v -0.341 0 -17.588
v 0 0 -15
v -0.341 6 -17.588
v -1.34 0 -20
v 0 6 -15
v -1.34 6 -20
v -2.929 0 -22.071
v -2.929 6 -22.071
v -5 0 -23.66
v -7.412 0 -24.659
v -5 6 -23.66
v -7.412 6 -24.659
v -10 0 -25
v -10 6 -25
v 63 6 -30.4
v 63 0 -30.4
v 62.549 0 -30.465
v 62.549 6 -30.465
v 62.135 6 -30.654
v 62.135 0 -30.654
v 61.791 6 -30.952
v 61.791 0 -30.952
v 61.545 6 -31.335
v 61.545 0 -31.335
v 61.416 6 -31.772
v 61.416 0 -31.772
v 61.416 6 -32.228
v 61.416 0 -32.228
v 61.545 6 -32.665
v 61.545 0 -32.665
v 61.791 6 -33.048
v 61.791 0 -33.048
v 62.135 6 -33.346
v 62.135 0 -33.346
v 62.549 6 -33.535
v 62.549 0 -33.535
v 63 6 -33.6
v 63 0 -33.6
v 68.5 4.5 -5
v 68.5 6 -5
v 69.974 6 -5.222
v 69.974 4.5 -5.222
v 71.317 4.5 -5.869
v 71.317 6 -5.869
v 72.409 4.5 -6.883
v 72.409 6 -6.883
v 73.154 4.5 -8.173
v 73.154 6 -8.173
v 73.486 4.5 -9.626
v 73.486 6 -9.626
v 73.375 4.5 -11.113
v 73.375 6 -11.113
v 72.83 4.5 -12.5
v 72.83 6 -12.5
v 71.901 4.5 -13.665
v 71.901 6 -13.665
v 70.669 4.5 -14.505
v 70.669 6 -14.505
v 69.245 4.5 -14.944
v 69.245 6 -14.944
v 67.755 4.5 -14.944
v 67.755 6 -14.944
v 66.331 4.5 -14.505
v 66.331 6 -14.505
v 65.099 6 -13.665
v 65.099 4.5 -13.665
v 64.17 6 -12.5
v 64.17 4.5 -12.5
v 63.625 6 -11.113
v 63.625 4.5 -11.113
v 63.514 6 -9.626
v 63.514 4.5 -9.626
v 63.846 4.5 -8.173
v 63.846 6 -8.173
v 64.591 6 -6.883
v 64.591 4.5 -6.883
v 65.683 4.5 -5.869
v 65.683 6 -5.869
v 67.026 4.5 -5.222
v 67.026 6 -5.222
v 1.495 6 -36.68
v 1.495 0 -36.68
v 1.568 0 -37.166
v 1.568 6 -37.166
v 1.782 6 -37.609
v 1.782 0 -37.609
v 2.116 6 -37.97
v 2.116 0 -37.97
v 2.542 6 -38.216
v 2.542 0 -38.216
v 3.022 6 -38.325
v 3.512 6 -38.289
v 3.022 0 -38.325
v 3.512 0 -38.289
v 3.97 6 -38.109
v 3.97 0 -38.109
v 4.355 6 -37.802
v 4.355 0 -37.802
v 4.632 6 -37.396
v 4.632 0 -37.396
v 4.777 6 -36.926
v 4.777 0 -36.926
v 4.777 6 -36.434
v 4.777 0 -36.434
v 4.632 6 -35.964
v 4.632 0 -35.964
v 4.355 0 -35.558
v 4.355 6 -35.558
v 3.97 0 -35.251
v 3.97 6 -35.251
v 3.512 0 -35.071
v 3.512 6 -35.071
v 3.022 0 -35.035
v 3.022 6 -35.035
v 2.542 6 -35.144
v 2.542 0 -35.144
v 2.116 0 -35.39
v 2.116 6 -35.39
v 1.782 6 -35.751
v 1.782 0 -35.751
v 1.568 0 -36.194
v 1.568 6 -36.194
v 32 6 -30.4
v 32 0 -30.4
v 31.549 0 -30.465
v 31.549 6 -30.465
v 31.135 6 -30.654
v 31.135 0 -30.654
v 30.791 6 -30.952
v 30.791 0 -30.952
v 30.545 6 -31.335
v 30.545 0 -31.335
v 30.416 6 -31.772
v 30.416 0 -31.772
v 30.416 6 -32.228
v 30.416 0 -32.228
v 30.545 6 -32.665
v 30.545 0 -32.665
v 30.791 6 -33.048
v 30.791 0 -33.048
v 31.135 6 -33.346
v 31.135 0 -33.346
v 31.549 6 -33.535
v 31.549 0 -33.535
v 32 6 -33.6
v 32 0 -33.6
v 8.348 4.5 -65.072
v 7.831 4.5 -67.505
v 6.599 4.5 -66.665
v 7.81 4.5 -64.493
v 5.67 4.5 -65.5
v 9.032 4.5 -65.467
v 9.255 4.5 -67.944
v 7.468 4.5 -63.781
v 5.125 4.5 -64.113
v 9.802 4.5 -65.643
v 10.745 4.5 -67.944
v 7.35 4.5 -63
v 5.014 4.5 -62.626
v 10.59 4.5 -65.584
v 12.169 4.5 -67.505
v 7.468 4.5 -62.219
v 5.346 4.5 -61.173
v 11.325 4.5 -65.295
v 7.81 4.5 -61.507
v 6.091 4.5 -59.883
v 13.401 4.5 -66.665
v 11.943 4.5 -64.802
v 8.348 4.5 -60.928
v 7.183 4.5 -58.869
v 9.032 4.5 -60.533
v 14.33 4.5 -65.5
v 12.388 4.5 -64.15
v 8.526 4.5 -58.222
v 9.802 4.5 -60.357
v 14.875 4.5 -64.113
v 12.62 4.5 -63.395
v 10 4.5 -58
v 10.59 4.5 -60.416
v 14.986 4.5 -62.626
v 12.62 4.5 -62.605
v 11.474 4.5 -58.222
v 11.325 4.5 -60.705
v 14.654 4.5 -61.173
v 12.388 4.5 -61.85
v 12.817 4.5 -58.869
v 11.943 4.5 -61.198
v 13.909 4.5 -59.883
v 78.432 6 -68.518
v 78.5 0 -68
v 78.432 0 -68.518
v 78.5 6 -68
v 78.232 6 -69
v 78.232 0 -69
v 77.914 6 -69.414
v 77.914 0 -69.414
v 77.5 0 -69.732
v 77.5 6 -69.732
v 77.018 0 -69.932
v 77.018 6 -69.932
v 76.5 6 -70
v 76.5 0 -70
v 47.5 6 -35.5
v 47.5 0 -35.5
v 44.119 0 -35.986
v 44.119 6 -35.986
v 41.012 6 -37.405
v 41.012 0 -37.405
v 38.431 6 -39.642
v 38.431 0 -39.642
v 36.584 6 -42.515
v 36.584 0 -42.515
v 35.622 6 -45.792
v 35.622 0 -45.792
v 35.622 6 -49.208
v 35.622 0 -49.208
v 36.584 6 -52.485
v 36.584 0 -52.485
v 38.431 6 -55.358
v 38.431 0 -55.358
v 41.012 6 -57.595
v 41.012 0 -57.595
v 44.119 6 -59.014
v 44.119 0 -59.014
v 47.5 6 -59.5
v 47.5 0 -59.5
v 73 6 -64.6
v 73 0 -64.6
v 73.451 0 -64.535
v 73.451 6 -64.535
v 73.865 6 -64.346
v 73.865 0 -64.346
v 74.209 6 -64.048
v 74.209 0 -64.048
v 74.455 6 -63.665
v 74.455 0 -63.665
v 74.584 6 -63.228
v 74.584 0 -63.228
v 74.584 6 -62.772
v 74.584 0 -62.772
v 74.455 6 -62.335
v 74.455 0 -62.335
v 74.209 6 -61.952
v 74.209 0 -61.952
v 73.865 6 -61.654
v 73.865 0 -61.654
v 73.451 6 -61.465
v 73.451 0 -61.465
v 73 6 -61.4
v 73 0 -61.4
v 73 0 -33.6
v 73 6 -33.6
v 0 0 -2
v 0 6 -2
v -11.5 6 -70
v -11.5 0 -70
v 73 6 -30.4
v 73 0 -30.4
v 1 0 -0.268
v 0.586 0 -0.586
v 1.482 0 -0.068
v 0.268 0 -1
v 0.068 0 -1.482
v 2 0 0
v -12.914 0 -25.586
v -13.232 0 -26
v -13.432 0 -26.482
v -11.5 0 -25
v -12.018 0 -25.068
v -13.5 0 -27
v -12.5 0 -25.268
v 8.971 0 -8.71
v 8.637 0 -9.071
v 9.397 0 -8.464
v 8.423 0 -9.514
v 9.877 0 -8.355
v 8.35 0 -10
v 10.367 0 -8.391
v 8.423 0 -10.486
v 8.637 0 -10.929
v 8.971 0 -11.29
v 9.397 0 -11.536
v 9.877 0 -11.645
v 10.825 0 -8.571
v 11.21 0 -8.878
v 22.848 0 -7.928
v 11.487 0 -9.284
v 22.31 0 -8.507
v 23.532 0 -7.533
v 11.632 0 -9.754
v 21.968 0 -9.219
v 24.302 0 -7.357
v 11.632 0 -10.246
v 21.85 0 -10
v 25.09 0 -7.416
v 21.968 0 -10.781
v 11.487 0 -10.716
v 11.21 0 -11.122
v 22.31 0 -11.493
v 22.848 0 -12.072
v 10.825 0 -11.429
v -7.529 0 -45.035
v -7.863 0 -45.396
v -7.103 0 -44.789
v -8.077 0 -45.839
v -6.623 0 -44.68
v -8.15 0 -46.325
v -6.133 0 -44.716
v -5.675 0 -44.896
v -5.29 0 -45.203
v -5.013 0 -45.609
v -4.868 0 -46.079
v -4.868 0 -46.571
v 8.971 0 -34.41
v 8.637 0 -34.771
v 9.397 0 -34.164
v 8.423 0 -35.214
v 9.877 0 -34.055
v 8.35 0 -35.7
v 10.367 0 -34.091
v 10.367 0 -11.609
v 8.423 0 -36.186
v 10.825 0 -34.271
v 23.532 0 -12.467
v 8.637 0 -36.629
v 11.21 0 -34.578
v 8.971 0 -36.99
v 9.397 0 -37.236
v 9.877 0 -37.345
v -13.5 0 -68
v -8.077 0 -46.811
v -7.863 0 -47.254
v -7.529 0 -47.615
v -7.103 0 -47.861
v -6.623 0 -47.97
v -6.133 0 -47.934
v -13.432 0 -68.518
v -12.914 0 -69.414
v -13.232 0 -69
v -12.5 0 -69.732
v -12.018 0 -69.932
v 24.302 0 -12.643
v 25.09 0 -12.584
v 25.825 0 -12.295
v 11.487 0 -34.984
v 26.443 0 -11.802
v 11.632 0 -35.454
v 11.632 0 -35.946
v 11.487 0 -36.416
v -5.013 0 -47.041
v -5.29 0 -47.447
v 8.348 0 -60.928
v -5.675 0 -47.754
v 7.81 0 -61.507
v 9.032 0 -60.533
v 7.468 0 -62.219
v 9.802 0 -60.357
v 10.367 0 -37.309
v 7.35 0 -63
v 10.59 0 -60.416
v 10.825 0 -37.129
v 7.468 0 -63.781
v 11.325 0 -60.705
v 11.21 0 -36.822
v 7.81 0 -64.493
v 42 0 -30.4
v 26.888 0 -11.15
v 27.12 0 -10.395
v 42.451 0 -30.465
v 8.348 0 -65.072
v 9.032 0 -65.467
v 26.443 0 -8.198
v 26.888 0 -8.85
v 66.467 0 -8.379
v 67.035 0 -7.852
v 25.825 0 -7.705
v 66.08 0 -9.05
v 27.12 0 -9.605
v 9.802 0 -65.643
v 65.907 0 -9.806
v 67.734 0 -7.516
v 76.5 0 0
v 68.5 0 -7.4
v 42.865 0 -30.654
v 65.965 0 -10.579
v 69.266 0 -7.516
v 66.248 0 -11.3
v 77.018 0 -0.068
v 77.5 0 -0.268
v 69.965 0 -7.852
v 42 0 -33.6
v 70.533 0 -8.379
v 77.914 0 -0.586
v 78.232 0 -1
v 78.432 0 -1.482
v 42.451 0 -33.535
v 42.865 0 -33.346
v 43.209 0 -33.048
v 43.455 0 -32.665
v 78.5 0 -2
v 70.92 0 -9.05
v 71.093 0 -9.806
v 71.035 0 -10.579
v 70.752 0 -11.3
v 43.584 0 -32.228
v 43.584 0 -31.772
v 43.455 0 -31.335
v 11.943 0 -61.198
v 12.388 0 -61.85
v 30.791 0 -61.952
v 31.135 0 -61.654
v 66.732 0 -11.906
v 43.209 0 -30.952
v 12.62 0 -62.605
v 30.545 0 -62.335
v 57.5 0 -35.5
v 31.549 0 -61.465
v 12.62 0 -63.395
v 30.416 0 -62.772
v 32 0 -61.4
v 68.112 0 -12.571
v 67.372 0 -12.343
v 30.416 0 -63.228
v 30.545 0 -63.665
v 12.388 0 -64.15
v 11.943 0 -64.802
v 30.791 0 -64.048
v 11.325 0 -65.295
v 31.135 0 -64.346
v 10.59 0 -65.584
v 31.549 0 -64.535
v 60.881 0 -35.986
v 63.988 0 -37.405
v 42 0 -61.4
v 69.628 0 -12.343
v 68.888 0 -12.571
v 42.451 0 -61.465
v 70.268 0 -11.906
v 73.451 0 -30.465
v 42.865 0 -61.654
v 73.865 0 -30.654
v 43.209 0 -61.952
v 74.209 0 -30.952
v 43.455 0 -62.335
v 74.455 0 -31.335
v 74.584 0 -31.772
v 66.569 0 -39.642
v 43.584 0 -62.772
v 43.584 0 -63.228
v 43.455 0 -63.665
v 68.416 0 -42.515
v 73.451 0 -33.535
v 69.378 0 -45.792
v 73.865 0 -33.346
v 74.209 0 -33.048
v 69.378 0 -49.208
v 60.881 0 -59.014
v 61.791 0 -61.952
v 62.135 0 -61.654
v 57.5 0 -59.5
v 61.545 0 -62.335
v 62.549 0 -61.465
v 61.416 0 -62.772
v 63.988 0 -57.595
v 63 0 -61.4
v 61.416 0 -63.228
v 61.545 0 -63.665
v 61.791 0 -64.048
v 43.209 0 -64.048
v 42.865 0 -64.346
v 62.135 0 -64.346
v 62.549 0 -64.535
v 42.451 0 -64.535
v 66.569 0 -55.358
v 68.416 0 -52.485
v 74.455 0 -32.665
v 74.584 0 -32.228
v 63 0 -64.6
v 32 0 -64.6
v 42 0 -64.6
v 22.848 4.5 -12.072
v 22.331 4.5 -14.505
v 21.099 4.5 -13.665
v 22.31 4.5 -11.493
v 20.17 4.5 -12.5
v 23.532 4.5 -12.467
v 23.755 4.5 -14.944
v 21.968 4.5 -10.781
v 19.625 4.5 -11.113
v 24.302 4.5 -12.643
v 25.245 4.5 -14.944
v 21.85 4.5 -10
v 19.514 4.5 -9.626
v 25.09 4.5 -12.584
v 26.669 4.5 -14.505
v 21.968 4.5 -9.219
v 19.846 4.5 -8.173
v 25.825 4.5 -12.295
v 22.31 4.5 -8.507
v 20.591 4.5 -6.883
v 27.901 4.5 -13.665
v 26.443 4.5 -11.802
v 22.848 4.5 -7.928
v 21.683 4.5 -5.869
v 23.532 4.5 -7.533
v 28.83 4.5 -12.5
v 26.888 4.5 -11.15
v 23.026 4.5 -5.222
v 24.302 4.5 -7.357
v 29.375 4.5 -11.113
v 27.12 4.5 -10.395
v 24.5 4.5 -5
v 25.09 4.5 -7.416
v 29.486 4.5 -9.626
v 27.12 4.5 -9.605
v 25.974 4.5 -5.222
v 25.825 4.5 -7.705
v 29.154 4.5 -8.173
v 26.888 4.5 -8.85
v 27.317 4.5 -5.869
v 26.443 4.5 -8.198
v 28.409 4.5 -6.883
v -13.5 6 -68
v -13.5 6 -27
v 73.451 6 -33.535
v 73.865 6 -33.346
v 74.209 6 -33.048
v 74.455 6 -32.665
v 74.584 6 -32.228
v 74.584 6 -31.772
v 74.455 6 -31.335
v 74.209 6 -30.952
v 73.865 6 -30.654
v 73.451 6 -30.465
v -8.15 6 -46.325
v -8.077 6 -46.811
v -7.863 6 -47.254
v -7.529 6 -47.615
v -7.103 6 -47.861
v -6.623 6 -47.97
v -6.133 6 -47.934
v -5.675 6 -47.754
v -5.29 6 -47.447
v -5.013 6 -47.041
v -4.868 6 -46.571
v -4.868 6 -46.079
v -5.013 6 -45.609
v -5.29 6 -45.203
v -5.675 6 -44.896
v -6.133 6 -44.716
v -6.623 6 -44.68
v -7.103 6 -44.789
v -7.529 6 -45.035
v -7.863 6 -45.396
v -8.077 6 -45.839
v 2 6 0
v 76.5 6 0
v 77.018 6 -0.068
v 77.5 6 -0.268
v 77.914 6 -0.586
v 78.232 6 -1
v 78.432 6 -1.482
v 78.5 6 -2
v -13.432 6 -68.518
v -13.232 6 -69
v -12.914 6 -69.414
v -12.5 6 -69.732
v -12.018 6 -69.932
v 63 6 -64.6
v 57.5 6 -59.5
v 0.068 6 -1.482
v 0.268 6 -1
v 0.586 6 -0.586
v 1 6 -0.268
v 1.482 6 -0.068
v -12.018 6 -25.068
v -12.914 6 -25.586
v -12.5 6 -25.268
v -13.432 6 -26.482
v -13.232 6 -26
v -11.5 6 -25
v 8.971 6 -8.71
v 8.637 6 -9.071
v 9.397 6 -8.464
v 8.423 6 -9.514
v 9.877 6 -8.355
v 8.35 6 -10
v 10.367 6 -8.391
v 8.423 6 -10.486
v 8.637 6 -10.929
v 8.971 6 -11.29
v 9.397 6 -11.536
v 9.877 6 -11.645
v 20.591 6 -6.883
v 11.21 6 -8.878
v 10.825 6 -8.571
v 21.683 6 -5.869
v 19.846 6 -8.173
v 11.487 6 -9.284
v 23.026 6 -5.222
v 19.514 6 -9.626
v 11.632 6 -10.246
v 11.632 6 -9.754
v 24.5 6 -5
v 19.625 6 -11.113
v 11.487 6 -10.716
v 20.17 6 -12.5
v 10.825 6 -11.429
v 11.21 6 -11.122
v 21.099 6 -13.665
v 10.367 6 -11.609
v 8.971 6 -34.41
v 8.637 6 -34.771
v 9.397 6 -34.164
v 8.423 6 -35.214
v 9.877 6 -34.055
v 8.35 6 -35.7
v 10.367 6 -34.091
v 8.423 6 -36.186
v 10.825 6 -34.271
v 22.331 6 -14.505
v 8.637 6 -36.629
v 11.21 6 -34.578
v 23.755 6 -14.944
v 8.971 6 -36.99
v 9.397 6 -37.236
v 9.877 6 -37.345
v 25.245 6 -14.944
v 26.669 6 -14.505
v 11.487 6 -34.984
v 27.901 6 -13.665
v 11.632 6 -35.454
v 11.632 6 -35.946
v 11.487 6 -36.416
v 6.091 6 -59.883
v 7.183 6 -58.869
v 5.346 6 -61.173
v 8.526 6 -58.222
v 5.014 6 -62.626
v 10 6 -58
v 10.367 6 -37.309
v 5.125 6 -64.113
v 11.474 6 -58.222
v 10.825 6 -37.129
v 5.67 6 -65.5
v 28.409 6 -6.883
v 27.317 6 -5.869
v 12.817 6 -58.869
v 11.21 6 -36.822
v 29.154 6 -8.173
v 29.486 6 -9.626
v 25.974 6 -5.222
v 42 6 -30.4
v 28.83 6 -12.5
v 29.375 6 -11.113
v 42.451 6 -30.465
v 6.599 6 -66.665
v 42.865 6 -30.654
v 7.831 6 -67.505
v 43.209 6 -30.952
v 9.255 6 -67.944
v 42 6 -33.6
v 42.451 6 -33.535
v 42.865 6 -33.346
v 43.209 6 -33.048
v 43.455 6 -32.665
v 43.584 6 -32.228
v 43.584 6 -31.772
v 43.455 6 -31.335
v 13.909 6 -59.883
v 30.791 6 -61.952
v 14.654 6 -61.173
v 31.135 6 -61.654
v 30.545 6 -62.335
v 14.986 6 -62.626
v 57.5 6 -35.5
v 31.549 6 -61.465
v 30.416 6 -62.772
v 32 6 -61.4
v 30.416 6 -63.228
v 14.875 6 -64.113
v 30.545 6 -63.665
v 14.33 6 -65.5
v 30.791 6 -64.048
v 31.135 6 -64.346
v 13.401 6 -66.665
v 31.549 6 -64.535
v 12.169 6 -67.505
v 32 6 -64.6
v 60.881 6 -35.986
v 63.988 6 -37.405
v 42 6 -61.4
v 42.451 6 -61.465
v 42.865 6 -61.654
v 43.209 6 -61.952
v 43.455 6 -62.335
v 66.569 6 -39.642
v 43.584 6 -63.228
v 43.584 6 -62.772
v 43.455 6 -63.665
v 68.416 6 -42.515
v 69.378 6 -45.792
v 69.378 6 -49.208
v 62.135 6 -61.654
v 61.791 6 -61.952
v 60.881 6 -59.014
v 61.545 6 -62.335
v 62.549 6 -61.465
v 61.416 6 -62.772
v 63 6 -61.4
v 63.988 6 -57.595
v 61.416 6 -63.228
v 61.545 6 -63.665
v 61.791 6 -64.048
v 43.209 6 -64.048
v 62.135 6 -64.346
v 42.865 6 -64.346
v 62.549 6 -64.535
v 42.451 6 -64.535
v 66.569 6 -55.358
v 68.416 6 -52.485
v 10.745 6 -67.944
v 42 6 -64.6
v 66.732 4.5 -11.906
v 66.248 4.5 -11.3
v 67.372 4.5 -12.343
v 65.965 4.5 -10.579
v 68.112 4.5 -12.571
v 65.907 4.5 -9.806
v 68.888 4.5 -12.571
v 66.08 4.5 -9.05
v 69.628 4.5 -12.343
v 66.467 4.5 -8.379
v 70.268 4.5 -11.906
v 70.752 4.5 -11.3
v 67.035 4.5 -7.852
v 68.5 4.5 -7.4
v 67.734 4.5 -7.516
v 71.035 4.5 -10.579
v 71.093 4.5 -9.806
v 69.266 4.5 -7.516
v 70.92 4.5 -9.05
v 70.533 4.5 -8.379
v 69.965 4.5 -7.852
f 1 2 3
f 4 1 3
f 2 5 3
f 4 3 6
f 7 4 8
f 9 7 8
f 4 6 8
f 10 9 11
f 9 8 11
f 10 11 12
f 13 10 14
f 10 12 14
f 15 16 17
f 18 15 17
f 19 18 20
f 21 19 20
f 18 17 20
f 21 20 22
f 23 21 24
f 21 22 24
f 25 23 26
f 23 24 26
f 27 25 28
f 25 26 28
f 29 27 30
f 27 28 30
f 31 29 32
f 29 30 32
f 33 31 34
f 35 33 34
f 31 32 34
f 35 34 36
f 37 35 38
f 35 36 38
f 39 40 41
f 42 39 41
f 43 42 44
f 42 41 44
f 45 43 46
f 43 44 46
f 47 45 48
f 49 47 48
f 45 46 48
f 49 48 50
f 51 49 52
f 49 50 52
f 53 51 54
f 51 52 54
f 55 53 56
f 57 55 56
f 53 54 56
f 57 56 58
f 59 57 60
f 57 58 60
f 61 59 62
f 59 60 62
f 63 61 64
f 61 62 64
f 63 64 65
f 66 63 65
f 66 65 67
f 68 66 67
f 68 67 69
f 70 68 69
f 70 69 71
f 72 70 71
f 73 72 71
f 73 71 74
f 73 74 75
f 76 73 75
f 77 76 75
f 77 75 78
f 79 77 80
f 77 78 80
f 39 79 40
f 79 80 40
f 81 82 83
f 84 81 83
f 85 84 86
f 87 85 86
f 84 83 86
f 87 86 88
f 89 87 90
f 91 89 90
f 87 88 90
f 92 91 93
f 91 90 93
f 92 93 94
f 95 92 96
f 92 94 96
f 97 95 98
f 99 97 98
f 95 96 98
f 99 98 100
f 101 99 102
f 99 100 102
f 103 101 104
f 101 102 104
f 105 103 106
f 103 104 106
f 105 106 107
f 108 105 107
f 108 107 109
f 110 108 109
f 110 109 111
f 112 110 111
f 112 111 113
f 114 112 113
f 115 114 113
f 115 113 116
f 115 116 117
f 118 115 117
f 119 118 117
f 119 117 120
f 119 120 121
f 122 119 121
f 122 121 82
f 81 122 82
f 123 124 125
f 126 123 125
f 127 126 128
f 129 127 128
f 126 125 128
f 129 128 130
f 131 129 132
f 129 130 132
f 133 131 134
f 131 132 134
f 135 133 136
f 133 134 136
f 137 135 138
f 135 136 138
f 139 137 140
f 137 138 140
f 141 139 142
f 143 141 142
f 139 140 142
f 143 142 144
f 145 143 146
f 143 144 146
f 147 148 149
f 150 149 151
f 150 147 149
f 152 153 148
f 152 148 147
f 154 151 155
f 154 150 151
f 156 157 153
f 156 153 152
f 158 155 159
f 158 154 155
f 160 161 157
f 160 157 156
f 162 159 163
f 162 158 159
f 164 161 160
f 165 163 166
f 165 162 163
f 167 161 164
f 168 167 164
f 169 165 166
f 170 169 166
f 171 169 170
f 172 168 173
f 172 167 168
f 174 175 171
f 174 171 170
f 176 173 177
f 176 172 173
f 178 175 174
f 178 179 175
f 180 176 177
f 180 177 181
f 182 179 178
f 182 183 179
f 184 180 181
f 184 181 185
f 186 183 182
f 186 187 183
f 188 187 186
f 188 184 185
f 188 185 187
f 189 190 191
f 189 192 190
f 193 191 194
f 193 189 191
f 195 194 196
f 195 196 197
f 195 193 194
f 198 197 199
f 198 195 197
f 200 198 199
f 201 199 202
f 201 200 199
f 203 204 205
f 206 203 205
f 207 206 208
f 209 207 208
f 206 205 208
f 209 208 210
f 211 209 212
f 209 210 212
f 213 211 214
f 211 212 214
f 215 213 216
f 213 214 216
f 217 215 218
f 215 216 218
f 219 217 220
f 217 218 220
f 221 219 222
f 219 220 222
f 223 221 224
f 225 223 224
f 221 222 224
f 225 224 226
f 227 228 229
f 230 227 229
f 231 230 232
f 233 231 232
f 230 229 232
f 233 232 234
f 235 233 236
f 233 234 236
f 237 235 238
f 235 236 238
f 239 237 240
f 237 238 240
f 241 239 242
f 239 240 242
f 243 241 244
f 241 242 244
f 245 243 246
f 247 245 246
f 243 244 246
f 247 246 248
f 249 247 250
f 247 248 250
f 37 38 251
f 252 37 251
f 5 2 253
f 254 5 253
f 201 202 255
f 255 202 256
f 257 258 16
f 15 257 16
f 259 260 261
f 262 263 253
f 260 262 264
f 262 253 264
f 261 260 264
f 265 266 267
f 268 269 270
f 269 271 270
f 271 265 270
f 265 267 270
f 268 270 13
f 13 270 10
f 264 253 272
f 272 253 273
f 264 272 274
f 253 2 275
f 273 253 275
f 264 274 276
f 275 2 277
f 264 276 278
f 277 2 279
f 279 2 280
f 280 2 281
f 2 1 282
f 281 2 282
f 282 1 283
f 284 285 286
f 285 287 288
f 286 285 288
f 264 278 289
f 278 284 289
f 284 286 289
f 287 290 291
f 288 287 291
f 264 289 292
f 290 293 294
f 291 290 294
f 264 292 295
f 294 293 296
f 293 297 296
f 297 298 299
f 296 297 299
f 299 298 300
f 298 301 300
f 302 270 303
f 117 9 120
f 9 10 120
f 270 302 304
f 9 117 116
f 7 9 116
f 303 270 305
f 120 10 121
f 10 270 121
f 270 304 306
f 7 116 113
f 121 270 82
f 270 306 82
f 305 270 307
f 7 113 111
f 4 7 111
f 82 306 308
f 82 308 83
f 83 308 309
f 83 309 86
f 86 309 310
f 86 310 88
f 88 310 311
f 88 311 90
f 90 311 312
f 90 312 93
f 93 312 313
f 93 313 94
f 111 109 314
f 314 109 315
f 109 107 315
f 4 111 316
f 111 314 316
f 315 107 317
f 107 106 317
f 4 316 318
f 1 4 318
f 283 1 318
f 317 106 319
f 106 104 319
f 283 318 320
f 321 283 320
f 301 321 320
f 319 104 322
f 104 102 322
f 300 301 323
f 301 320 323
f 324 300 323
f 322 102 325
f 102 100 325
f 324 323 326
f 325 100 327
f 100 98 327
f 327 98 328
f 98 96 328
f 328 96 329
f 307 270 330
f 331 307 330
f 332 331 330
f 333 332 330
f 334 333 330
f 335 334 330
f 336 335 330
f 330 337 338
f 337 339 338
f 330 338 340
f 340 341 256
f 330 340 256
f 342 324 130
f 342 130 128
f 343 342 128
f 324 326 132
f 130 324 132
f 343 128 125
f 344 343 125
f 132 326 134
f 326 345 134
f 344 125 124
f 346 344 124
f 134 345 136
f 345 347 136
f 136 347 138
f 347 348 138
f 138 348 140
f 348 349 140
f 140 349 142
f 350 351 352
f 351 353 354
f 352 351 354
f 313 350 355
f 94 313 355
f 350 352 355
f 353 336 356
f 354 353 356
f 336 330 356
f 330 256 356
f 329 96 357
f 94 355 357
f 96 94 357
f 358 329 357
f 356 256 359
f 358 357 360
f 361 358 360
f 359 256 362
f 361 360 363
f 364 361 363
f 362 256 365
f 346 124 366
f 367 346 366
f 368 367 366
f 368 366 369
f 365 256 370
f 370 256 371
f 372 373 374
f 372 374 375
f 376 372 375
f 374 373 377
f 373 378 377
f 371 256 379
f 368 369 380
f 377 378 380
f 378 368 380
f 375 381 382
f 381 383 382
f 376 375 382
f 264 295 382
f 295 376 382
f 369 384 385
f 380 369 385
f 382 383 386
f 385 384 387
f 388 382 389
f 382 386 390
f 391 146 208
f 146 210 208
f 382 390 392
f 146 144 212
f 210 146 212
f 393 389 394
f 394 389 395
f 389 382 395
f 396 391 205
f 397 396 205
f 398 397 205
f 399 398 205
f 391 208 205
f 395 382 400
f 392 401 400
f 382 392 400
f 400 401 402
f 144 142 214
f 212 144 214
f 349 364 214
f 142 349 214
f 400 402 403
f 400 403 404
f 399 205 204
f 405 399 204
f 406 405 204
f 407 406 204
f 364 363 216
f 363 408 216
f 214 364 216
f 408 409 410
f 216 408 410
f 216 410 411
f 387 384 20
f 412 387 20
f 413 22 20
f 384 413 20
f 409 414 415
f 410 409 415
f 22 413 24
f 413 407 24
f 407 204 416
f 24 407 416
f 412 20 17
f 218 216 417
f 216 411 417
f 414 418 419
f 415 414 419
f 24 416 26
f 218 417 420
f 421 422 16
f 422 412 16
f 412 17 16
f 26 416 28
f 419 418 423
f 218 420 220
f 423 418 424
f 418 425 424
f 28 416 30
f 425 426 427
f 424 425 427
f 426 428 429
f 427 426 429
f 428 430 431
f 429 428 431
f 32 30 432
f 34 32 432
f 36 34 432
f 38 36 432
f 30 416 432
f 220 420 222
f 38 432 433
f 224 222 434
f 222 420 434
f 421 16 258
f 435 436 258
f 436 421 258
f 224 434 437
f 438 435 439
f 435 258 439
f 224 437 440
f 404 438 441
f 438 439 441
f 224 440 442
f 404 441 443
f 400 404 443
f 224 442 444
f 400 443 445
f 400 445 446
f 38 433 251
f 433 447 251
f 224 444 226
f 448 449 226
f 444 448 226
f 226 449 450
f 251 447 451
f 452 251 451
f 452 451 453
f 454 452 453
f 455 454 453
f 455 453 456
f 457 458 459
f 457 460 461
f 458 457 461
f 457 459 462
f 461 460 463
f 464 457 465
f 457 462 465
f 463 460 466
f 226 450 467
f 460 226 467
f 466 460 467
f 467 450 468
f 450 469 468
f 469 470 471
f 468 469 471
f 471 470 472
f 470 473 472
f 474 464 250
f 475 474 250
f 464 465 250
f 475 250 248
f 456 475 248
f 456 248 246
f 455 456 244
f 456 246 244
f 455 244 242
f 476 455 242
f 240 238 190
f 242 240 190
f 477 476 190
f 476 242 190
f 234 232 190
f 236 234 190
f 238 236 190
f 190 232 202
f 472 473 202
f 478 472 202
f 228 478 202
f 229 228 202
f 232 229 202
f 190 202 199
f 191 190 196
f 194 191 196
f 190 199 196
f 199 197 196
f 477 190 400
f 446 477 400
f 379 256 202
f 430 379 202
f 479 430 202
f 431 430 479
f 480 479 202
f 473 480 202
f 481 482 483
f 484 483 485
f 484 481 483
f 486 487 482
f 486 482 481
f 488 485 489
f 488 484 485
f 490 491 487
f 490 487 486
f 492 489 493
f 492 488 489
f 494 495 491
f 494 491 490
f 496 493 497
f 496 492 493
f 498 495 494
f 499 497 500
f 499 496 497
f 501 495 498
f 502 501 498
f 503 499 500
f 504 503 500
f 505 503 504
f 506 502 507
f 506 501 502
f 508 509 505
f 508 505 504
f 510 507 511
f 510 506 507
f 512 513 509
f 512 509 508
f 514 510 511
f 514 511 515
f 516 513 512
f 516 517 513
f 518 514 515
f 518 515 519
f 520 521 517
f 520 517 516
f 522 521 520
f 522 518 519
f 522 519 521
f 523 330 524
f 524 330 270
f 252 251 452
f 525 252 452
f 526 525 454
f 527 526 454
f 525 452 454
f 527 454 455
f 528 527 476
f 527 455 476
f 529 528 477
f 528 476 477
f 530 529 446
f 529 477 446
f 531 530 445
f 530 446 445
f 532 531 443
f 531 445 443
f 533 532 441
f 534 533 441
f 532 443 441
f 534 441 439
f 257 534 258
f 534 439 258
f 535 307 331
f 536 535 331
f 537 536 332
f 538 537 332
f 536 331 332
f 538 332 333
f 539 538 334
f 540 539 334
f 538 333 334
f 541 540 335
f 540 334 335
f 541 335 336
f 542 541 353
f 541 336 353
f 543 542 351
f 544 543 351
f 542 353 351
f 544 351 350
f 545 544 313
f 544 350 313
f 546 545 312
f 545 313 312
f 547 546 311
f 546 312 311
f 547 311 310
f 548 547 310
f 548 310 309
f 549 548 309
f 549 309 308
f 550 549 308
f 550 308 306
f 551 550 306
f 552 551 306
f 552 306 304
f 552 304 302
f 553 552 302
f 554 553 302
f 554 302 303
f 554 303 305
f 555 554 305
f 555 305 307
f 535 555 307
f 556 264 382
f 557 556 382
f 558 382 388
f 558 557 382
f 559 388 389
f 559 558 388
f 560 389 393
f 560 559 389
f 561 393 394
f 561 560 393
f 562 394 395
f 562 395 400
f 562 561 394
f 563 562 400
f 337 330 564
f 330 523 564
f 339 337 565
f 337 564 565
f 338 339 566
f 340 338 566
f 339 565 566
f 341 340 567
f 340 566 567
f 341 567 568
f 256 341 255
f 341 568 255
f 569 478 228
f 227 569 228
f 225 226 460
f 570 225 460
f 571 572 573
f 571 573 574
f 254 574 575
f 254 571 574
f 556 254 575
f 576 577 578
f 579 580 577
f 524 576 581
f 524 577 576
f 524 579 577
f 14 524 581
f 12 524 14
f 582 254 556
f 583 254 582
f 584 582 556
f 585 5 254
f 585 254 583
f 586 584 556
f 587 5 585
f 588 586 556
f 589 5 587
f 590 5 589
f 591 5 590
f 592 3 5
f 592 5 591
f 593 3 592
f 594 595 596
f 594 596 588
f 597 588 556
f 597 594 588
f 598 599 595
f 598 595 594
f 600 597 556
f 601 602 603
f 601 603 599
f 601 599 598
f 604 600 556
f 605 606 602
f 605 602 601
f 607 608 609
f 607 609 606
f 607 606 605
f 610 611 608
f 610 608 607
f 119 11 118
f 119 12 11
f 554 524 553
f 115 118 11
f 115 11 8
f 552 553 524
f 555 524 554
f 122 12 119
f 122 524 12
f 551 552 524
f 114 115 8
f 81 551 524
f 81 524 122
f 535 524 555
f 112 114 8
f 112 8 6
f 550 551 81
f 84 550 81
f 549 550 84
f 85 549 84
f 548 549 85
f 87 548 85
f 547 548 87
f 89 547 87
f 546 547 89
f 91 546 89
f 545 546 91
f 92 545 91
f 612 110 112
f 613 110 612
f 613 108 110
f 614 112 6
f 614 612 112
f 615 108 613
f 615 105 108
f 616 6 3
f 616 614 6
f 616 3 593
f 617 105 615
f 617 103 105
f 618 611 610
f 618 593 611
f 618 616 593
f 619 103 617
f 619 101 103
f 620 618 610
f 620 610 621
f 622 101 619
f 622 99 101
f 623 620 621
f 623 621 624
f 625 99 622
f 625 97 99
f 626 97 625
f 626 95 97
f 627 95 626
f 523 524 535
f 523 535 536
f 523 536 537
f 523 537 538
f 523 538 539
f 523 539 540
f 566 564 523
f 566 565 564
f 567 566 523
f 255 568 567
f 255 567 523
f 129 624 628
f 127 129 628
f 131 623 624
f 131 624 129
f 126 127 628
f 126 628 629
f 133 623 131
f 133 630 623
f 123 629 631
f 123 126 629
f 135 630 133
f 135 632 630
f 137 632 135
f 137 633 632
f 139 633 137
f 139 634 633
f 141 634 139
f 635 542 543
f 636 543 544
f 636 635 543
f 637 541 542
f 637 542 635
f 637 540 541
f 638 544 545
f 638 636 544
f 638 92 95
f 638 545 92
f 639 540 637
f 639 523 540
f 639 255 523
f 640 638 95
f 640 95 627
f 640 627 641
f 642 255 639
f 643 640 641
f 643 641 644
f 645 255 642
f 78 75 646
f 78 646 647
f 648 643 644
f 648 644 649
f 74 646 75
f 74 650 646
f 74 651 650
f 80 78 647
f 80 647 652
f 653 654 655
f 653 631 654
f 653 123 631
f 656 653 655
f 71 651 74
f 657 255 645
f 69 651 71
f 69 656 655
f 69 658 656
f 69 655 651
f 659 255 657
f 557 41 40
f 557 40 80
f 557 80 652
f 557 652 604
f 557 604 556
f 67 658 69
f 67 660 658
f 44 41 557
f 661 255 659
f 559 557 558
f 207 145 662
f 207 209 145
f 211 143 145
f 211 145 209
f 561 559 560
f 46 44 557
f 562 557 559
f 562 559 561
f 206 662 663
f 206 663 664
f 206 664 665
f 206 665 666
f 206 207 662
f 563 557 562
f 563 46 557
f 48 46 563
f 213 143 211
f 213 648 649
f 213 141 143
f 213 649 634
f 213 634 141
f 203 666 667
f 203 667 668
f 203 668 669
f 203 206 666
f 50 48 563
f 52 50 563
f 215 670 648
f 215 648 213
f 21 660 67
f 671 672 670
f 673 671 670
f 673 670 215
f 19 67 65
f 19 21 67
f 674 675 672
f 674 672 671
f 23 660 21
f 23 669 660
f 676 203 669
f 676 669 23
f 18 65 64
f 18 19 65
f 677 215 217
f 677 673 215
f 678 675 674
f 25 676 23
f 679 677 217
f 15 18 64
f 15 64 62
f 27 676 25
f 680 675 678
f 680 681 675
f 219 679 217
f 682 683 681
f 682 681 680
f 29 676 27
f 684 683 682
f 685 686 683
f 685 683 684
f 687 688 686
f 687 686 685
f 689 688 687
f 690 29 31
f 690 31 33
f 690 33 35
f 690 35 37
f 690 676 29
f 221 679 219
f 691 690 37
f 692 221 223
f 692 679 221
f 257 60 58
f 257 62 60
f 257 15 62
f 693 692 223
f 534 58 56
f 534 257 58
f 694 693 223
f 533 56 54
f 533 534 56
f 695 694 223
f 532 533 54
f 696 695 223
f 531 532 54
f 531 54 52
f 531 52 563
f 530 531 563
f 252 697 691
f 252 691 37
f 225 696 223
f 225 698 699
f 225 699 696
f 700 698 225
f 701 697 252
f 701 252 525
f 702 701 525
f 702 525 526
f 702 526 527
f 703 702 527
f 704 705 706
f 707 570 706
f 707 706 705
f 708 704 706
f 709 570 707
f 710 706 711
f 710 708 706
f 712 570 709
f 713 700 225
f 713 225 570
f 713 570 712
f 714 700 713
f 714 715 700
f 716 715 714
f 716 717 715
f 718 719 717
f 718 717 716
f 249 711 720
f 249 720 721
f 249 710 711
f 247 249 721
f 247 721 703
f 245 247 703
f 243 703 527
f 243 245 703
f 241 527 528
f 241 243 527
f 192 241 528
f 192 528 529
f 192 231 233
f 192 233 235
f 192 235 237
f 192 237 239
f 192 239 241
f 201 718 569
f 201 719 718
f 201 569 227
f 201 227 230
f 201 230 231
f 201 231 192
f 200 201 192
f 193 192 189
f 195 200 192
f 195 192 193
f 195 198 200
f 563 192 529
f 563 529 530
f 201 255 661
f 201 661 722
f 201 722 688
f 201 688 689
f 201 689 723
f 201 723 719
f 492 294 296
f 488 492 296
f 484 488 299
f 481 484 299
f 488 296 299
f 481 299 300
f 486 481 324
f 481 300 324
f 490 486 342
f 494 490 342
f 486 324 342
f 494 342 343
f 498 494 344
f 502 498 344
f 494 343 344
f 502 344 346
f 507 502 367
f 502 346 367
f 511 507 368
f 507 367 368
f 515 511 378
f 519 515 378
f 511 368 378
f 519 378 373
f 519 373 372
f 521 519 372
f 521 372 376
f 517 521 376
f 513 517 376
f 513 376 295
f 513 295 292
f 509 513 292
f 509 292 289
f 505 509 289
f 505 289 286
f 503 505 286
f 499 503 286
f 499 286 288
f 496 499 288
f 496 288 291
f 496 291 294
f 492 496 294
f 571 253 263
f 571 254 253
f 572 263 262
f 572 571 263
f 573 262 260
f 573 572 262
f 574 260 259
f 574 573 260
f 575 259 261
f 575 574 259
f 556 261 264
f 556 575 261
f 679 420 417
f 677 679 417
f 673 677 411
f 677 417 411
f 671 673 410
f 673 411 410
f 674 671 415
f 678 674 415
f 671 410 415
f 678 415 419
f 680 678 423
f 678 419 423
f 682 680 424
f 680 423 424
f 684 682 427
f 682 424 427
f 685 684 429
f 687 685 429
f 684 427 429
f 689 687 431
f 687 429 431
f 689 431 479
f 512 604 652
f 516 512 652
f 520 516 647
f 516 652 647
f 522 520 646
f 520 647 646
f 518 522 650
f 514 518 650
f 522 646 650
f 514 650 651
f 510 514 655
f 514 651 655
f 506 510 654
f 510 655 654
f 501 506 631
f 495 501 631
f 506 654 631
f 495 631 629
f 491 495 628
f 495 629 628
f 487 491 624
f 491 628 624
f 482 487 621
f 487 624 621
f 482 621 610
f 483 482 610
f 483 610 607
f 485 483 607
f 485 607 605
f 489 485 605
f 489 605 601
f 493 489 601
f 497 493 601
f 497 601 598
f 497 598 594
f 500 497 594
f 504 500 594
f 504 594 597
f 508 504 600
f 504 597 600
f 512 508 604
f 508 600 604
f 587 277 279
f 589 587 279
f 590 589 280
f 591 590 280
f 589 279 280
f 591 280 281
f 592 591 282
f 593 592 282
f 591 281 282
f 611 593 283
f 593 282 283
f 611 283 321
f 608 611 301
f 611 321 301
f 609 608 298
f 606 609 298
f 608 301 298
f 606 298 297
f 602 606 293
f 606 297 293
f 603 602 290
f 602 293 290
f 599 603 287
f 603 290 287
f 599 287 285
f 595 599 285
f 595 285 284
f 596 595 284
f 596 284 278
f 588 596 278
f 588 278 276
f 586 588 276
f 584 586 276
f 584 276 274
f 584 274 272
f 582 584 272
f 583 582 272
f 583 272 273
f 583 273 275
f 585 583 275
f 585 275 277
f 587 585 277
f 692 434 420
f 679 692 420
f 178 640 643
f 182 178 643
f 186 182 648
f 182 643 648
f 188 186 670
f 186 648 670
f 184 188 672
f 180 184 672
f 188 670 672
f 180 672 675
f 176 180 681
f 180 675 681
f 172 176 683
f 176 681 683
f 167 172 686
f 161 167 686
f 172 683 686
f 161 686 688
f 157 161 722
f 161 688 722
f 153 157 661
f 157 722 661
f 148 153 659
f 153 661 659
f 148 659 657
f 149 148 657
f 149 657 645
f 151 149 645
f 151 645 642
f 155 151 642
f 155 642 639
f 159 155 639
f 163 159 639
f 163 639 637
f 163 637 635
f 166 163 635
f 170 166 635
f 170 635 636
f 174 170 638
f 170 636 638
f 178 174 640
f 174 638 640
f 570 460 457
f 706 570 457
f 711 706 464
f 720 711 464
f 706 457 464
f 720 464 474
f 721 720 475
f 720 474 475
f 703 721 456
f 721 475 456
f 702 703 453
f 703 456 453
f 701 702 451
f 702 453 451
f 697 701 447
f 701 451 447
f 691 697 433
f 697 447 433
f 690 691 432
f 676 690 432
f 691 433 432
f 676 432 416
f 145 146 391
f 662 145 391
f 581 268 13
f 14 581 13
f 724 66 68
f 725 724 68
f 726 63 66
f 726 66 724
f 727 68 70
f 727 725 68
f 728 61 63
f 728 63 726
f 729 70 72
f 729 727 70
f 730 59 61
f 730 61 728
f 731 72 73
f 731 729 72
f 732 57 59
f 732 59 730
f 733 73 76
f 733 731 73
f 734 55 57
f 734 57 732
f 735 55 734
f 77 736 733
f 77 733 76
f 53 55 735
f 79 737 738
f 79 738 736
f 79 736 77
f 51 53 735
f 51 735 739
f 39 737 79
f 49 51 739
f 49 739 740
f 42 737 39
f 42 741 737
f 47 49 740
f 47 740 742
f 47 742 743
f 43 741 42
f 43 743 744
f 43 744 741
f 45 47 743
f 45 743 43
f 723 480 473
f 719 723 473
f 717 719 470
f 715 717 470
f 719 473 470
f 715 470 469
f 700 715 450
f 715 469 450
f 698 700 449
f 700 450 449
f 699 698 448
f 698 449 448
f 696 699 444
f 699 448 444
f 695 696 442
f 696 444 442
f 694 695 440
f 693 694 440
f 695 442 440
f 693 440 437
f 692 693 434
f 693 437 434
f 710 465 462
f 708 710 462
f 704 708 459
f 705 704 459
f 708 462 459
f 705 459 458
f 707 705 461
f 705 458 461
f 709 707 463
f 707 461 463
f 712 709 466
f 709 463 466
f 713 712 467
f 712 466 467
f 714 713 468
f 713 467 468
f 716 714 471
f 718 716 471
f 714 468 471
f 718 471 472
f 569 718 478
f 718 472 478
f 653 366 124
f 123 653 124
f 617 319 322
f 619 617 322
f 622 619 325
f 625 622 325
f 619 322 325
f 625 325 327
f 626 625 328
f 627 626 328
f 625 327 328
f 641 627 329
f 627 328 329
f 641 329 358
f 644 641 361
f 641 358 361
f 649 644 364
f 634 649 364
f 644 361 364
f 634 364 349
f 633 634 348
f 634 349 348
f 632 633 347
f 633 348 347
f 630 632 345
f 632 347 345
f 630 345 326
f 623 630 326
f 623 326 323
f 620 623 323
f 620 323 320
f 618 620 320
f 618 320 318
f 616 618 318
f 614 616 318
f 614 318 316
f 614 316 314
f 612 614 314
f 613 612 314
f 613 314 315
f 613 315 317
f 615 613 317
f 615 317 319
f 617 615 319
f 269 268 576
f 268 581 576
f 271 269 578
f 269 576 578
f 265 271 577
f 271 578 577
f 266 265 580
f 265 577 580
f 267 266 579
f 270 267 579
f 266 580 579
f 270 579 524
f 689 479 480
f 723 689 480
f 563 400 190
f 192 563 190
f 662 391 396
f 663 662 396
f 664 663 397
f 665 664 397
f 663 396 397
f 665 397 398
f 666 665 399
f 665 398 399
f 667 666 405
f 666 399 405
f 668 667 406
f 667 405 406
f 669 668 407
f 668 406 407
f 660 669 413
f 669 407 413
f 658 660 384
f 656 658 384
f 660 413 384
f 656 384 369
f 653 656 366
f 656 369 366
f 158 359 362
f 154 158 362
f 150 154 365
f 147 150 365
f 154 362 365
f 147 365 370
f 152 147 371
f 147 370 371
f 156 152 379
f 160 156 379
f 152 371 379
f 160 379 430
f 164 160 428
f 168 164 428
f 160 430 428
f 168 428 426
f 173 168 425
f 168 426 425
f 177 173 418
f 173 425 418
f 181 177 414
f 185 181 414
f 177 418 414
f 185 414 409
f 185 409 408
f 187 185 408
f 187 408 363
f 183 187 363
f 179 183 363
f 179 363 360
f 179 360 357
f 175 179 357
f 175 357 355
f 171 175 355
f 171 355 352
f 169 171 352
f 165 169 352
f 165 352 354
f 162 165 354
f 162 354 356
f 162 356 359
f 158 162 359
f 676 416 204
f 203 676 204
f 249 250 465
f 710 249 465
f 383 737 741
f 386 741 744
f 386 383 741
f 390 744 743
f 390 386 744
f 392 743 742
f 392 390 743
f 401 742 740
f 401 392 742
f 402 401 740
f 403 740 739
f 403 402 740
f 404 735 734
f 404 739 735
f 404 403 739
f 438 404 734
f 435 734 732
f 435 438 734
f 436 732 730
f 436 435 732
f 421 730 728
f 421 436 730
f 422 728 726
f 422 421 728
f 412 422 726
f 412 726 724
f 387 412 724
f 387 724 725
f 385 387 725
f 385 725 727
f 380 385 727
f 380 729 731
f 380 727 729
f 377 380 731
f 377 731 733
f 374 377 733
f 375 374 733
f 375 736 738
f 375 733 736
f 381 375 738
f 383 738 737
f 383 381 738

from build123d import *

# Parameters (mm, degrees)
SKETCH3_R                   = 2.6
BOSS_EXTRUDE1_DEPTH         = 6
FILLET1_R                   = 10
M3_CLEARANCE_HOLE1_D        = 3.2
M4X0_7_TAPPED_HOLE1_D       = 3.3
FILLET2_R                   = 2
SKETCH5_R                   = 5
COUNTERBORE_DEPTH           = 1.5
SKETCH14_R                  = 5
SKETCH14_R_2                = 1.6
HOLE_FILLER_DEPTH           = 6
M5_HOLE_RELOCATION_OPTION_R = 5
CUT_EXTRUDE1_DEPTH          = 1.5
M5_CLEARANCE_HOLE1_D        = 5.3
M4X0_7_TAPPED_HOLE2_D       = 3.3


with BuildPart() as part:
    # Sketch3 → Boss-Extrude1 (new body)
    with BuildSketch(Plane(origin=(0, 0, 0), x_dir=(1, 0, 0), z_dir=(0, 1, 0))):
        Polygon((0, 0), (78.5, 0), (78.5, 70), (0, 70), (-13.5, 70), (-13.5, 25), (0, 25), align=None)
        with Locations(Location((10, 56, 0), (0, 0, 270))):
            Circle(SKETCH3_R, mode=Mode.SUBTRACT)
        with Locations(Location((10, 10, 0), (0, 0, 270))):
            Circle(SKETCH3_R, mode=Mode.SUBTRACT)
        with Locations(Location((68.5, 10, 0), (0, 0, 270))):
            Circle(SKETCH3_R, mode=Mode.SUBTRACT)
        with Locations(Location((30, 10, 0), (0, 0, 270))):
            Circle(SKETCH3_R, mode=Mode.SUBTRACT)
        with BuildLine():
            Line((47.5, 59.5), (57.5, 59.5))
            ThreePointArc((57.5, 59.5), (69.5, 47.5), (57.5, 35.5))
            Line((57.5, 35.5), (47.5, 35.5))
            ThreePointArc((47.5, 35.5), (35.5, 47.5), (47.5, 59.5))
        make_face(mode=Mode.SUBTRACT)
        with BuildLine():
            Line((32, 64.6), (42, 64.6))
            ThreePointArc((42, 64.6), (43.6, 63), (42, 61.4))
            Line((42, 61.4), (32, 61.4))
            ThreePointArc((32, 61.4), (30.4, 63), (32, 64.6))
        make_face(mode=Mode.SUBTRACT)
        with BuildLine():
            Line((63, 64.6), (73, 64.6))
            ThreePointArc((73, 64.6), (74.6, 63), (73, 61.4))
            Line((73, 61.4), (63, 61.4))
            ThreePointArc((63, 61.4), (61.4, 63), (63, 64.6))
        make_face(mode=Mode.SUBTRACT)
        with BuildLine():
            Line((63, 33.6), (73, 33.6))
            ThreePointArc((73, 33.6), (74.6, 32), (73, 30.4))
            Line((73, 30.4), (63, 30.4))
            ThreePointArc((63, 30.4), (61.4, 32), (63, 33.6))
        make_face(mode=Mode.SUBTRACT)
        with BuildLine():
            Line((32, 33.6), (42, 33.6))
            ThreePointArc((42, 33.6), (43.6, 32), (42, 30.4))
            Line((42, 30.4), (32, 30.4))
            ThreePointArc((32, 30.4), (30.4, 32), (32, 33.6))
        make_face(mode=Mode.SUBTRACT)
    extrude(amount=BOSS_EXTRUDE1_DEPTH)

    # Fillet1
    fillet1_edges = [part.edges().sort_by_distance(p)[0] for p in [
        (0, 3, -25),
    ]]
    fillet(fillet1_edges, radius=FILLET1_R)

    # M3 Clearance Hole1 (through all)
    with Locations(Plane(origin=(0, 6, 0), x_dir=(1, 0, 0), z_dir=(0, 1, 0))):
        with Locations((10, 64.325), (-6.5, 64.325)):
            Hole(M3_CLEARANCE_HOLE1_D / 2)

    # M4x0.7 Tapped Hole1 (through all)
    with Locations(Plane(origin=(0, 6, 0), x_dir=(1, 0, 0), z_dir=(0, 1, 0))):
        with Locations((-6.5, 46.325), (10, 35.7)):
            Hole(M4X0_7_TAPPED_HOLE1_D / 2)

    # Fillet2
    fillet2_edges = [part.edges().sort_by_distance(p)[0] for p in [
        (-13.5, 3, -25),
        (-13.5, 3, -70),
        (78.5, 3, -70),
        (78.5, 3, 0),
        (0, 3, 0),
    ]]
    fillet(fillet2_edges, radius=FILLET2_R)

    # Sketch5 → Counterbore (cut)
    with BuildSketch(Plane(origin=(0, 6, 0), x_dir=(1, 0, 0), z_dir=(0, 1, 0))):
        with Locations(Location((10, 56, 0), (0, 0, 270))):
            Circle(SKETCH5_R)
        with Locations(Location((10, 10, 0), (0, 0, 270))):
            Circle(SKETCH5_R)
        with Locations(Location((30, 10, 0), (0, 0, 270))):
            Circle(SKETCH5_R)
        with Locations(Location((68.5, 10, 0), (0, 0, 270))):
            Circle(SKETCH5_R)
    extrude(amount=-COUNTERBORE_DEPTH, mode=Mode.SUBTRACT)

    # Sketch14 → Hole Filler (add)
    with BuildSketch(Plane(origin=(0, 6, 0), x_dir=(1, 0, 0), z_dir=(0, 1, 0))):
        with Locations((10, 10)):
            Circle(SKETCH14_R)
        with Locations((10, 56)):
            Circle(SKETCH14_R)
        with Locations((-6.5, 64.325)):
            Circle(SKETCH14_R_2)
        with Locations((10, 64.325)):
            Circle(SKETCH14_R_2)
        with Locations((30, 10)):
            Circle(SKETCH14_R)
    extrude(amount=-HOLE_FILLER_DEPTH)

    # M5 hole relocation option → Cut-Extrude1 (cut)
    with BuildSketch(Plane(origin=(0, 6, 0), x_dir=(1, 0, 0), z_dir=(0, 1, 0))):
        with Locations(Location((24.5, 10, 0), (0, 0, 270))):
            Circle(M5_HOLE_RELOCATION_OPTION_R)
        with Locations(Location((10, 63, 0), (0, 0, 270))):
            Circle(M5_HOLE_RELOCATION_OPTION_R)
    extrude(amount=-CUT_EXTRUDE1_DEPTH, mode=Mode.SUBTRACT)

    # M5 Clearance Hole1 (through all)
    with Locations(Plane(origin=(0, 4.5, 0), x_dir=(1, 0, 0), z_dir=(0, 1, 0))):
        with Locations((24.5, 10), (10, 63)):
            Hole(M5_CLEARANCE_HOLE1_D / 2)

    # M4x0.7 Tapped Hole2 (through all)
    with Locations(Plane(origin=(0, 6, 0), x_dir=(1, 0, 0), z_dir=(0, 1, 0))):
        with Locations((10, 10), (3.145, 36.68)):
            Hole(M4X0_7_TAPPED_HOLE2_D / 2)


solid = part.part
